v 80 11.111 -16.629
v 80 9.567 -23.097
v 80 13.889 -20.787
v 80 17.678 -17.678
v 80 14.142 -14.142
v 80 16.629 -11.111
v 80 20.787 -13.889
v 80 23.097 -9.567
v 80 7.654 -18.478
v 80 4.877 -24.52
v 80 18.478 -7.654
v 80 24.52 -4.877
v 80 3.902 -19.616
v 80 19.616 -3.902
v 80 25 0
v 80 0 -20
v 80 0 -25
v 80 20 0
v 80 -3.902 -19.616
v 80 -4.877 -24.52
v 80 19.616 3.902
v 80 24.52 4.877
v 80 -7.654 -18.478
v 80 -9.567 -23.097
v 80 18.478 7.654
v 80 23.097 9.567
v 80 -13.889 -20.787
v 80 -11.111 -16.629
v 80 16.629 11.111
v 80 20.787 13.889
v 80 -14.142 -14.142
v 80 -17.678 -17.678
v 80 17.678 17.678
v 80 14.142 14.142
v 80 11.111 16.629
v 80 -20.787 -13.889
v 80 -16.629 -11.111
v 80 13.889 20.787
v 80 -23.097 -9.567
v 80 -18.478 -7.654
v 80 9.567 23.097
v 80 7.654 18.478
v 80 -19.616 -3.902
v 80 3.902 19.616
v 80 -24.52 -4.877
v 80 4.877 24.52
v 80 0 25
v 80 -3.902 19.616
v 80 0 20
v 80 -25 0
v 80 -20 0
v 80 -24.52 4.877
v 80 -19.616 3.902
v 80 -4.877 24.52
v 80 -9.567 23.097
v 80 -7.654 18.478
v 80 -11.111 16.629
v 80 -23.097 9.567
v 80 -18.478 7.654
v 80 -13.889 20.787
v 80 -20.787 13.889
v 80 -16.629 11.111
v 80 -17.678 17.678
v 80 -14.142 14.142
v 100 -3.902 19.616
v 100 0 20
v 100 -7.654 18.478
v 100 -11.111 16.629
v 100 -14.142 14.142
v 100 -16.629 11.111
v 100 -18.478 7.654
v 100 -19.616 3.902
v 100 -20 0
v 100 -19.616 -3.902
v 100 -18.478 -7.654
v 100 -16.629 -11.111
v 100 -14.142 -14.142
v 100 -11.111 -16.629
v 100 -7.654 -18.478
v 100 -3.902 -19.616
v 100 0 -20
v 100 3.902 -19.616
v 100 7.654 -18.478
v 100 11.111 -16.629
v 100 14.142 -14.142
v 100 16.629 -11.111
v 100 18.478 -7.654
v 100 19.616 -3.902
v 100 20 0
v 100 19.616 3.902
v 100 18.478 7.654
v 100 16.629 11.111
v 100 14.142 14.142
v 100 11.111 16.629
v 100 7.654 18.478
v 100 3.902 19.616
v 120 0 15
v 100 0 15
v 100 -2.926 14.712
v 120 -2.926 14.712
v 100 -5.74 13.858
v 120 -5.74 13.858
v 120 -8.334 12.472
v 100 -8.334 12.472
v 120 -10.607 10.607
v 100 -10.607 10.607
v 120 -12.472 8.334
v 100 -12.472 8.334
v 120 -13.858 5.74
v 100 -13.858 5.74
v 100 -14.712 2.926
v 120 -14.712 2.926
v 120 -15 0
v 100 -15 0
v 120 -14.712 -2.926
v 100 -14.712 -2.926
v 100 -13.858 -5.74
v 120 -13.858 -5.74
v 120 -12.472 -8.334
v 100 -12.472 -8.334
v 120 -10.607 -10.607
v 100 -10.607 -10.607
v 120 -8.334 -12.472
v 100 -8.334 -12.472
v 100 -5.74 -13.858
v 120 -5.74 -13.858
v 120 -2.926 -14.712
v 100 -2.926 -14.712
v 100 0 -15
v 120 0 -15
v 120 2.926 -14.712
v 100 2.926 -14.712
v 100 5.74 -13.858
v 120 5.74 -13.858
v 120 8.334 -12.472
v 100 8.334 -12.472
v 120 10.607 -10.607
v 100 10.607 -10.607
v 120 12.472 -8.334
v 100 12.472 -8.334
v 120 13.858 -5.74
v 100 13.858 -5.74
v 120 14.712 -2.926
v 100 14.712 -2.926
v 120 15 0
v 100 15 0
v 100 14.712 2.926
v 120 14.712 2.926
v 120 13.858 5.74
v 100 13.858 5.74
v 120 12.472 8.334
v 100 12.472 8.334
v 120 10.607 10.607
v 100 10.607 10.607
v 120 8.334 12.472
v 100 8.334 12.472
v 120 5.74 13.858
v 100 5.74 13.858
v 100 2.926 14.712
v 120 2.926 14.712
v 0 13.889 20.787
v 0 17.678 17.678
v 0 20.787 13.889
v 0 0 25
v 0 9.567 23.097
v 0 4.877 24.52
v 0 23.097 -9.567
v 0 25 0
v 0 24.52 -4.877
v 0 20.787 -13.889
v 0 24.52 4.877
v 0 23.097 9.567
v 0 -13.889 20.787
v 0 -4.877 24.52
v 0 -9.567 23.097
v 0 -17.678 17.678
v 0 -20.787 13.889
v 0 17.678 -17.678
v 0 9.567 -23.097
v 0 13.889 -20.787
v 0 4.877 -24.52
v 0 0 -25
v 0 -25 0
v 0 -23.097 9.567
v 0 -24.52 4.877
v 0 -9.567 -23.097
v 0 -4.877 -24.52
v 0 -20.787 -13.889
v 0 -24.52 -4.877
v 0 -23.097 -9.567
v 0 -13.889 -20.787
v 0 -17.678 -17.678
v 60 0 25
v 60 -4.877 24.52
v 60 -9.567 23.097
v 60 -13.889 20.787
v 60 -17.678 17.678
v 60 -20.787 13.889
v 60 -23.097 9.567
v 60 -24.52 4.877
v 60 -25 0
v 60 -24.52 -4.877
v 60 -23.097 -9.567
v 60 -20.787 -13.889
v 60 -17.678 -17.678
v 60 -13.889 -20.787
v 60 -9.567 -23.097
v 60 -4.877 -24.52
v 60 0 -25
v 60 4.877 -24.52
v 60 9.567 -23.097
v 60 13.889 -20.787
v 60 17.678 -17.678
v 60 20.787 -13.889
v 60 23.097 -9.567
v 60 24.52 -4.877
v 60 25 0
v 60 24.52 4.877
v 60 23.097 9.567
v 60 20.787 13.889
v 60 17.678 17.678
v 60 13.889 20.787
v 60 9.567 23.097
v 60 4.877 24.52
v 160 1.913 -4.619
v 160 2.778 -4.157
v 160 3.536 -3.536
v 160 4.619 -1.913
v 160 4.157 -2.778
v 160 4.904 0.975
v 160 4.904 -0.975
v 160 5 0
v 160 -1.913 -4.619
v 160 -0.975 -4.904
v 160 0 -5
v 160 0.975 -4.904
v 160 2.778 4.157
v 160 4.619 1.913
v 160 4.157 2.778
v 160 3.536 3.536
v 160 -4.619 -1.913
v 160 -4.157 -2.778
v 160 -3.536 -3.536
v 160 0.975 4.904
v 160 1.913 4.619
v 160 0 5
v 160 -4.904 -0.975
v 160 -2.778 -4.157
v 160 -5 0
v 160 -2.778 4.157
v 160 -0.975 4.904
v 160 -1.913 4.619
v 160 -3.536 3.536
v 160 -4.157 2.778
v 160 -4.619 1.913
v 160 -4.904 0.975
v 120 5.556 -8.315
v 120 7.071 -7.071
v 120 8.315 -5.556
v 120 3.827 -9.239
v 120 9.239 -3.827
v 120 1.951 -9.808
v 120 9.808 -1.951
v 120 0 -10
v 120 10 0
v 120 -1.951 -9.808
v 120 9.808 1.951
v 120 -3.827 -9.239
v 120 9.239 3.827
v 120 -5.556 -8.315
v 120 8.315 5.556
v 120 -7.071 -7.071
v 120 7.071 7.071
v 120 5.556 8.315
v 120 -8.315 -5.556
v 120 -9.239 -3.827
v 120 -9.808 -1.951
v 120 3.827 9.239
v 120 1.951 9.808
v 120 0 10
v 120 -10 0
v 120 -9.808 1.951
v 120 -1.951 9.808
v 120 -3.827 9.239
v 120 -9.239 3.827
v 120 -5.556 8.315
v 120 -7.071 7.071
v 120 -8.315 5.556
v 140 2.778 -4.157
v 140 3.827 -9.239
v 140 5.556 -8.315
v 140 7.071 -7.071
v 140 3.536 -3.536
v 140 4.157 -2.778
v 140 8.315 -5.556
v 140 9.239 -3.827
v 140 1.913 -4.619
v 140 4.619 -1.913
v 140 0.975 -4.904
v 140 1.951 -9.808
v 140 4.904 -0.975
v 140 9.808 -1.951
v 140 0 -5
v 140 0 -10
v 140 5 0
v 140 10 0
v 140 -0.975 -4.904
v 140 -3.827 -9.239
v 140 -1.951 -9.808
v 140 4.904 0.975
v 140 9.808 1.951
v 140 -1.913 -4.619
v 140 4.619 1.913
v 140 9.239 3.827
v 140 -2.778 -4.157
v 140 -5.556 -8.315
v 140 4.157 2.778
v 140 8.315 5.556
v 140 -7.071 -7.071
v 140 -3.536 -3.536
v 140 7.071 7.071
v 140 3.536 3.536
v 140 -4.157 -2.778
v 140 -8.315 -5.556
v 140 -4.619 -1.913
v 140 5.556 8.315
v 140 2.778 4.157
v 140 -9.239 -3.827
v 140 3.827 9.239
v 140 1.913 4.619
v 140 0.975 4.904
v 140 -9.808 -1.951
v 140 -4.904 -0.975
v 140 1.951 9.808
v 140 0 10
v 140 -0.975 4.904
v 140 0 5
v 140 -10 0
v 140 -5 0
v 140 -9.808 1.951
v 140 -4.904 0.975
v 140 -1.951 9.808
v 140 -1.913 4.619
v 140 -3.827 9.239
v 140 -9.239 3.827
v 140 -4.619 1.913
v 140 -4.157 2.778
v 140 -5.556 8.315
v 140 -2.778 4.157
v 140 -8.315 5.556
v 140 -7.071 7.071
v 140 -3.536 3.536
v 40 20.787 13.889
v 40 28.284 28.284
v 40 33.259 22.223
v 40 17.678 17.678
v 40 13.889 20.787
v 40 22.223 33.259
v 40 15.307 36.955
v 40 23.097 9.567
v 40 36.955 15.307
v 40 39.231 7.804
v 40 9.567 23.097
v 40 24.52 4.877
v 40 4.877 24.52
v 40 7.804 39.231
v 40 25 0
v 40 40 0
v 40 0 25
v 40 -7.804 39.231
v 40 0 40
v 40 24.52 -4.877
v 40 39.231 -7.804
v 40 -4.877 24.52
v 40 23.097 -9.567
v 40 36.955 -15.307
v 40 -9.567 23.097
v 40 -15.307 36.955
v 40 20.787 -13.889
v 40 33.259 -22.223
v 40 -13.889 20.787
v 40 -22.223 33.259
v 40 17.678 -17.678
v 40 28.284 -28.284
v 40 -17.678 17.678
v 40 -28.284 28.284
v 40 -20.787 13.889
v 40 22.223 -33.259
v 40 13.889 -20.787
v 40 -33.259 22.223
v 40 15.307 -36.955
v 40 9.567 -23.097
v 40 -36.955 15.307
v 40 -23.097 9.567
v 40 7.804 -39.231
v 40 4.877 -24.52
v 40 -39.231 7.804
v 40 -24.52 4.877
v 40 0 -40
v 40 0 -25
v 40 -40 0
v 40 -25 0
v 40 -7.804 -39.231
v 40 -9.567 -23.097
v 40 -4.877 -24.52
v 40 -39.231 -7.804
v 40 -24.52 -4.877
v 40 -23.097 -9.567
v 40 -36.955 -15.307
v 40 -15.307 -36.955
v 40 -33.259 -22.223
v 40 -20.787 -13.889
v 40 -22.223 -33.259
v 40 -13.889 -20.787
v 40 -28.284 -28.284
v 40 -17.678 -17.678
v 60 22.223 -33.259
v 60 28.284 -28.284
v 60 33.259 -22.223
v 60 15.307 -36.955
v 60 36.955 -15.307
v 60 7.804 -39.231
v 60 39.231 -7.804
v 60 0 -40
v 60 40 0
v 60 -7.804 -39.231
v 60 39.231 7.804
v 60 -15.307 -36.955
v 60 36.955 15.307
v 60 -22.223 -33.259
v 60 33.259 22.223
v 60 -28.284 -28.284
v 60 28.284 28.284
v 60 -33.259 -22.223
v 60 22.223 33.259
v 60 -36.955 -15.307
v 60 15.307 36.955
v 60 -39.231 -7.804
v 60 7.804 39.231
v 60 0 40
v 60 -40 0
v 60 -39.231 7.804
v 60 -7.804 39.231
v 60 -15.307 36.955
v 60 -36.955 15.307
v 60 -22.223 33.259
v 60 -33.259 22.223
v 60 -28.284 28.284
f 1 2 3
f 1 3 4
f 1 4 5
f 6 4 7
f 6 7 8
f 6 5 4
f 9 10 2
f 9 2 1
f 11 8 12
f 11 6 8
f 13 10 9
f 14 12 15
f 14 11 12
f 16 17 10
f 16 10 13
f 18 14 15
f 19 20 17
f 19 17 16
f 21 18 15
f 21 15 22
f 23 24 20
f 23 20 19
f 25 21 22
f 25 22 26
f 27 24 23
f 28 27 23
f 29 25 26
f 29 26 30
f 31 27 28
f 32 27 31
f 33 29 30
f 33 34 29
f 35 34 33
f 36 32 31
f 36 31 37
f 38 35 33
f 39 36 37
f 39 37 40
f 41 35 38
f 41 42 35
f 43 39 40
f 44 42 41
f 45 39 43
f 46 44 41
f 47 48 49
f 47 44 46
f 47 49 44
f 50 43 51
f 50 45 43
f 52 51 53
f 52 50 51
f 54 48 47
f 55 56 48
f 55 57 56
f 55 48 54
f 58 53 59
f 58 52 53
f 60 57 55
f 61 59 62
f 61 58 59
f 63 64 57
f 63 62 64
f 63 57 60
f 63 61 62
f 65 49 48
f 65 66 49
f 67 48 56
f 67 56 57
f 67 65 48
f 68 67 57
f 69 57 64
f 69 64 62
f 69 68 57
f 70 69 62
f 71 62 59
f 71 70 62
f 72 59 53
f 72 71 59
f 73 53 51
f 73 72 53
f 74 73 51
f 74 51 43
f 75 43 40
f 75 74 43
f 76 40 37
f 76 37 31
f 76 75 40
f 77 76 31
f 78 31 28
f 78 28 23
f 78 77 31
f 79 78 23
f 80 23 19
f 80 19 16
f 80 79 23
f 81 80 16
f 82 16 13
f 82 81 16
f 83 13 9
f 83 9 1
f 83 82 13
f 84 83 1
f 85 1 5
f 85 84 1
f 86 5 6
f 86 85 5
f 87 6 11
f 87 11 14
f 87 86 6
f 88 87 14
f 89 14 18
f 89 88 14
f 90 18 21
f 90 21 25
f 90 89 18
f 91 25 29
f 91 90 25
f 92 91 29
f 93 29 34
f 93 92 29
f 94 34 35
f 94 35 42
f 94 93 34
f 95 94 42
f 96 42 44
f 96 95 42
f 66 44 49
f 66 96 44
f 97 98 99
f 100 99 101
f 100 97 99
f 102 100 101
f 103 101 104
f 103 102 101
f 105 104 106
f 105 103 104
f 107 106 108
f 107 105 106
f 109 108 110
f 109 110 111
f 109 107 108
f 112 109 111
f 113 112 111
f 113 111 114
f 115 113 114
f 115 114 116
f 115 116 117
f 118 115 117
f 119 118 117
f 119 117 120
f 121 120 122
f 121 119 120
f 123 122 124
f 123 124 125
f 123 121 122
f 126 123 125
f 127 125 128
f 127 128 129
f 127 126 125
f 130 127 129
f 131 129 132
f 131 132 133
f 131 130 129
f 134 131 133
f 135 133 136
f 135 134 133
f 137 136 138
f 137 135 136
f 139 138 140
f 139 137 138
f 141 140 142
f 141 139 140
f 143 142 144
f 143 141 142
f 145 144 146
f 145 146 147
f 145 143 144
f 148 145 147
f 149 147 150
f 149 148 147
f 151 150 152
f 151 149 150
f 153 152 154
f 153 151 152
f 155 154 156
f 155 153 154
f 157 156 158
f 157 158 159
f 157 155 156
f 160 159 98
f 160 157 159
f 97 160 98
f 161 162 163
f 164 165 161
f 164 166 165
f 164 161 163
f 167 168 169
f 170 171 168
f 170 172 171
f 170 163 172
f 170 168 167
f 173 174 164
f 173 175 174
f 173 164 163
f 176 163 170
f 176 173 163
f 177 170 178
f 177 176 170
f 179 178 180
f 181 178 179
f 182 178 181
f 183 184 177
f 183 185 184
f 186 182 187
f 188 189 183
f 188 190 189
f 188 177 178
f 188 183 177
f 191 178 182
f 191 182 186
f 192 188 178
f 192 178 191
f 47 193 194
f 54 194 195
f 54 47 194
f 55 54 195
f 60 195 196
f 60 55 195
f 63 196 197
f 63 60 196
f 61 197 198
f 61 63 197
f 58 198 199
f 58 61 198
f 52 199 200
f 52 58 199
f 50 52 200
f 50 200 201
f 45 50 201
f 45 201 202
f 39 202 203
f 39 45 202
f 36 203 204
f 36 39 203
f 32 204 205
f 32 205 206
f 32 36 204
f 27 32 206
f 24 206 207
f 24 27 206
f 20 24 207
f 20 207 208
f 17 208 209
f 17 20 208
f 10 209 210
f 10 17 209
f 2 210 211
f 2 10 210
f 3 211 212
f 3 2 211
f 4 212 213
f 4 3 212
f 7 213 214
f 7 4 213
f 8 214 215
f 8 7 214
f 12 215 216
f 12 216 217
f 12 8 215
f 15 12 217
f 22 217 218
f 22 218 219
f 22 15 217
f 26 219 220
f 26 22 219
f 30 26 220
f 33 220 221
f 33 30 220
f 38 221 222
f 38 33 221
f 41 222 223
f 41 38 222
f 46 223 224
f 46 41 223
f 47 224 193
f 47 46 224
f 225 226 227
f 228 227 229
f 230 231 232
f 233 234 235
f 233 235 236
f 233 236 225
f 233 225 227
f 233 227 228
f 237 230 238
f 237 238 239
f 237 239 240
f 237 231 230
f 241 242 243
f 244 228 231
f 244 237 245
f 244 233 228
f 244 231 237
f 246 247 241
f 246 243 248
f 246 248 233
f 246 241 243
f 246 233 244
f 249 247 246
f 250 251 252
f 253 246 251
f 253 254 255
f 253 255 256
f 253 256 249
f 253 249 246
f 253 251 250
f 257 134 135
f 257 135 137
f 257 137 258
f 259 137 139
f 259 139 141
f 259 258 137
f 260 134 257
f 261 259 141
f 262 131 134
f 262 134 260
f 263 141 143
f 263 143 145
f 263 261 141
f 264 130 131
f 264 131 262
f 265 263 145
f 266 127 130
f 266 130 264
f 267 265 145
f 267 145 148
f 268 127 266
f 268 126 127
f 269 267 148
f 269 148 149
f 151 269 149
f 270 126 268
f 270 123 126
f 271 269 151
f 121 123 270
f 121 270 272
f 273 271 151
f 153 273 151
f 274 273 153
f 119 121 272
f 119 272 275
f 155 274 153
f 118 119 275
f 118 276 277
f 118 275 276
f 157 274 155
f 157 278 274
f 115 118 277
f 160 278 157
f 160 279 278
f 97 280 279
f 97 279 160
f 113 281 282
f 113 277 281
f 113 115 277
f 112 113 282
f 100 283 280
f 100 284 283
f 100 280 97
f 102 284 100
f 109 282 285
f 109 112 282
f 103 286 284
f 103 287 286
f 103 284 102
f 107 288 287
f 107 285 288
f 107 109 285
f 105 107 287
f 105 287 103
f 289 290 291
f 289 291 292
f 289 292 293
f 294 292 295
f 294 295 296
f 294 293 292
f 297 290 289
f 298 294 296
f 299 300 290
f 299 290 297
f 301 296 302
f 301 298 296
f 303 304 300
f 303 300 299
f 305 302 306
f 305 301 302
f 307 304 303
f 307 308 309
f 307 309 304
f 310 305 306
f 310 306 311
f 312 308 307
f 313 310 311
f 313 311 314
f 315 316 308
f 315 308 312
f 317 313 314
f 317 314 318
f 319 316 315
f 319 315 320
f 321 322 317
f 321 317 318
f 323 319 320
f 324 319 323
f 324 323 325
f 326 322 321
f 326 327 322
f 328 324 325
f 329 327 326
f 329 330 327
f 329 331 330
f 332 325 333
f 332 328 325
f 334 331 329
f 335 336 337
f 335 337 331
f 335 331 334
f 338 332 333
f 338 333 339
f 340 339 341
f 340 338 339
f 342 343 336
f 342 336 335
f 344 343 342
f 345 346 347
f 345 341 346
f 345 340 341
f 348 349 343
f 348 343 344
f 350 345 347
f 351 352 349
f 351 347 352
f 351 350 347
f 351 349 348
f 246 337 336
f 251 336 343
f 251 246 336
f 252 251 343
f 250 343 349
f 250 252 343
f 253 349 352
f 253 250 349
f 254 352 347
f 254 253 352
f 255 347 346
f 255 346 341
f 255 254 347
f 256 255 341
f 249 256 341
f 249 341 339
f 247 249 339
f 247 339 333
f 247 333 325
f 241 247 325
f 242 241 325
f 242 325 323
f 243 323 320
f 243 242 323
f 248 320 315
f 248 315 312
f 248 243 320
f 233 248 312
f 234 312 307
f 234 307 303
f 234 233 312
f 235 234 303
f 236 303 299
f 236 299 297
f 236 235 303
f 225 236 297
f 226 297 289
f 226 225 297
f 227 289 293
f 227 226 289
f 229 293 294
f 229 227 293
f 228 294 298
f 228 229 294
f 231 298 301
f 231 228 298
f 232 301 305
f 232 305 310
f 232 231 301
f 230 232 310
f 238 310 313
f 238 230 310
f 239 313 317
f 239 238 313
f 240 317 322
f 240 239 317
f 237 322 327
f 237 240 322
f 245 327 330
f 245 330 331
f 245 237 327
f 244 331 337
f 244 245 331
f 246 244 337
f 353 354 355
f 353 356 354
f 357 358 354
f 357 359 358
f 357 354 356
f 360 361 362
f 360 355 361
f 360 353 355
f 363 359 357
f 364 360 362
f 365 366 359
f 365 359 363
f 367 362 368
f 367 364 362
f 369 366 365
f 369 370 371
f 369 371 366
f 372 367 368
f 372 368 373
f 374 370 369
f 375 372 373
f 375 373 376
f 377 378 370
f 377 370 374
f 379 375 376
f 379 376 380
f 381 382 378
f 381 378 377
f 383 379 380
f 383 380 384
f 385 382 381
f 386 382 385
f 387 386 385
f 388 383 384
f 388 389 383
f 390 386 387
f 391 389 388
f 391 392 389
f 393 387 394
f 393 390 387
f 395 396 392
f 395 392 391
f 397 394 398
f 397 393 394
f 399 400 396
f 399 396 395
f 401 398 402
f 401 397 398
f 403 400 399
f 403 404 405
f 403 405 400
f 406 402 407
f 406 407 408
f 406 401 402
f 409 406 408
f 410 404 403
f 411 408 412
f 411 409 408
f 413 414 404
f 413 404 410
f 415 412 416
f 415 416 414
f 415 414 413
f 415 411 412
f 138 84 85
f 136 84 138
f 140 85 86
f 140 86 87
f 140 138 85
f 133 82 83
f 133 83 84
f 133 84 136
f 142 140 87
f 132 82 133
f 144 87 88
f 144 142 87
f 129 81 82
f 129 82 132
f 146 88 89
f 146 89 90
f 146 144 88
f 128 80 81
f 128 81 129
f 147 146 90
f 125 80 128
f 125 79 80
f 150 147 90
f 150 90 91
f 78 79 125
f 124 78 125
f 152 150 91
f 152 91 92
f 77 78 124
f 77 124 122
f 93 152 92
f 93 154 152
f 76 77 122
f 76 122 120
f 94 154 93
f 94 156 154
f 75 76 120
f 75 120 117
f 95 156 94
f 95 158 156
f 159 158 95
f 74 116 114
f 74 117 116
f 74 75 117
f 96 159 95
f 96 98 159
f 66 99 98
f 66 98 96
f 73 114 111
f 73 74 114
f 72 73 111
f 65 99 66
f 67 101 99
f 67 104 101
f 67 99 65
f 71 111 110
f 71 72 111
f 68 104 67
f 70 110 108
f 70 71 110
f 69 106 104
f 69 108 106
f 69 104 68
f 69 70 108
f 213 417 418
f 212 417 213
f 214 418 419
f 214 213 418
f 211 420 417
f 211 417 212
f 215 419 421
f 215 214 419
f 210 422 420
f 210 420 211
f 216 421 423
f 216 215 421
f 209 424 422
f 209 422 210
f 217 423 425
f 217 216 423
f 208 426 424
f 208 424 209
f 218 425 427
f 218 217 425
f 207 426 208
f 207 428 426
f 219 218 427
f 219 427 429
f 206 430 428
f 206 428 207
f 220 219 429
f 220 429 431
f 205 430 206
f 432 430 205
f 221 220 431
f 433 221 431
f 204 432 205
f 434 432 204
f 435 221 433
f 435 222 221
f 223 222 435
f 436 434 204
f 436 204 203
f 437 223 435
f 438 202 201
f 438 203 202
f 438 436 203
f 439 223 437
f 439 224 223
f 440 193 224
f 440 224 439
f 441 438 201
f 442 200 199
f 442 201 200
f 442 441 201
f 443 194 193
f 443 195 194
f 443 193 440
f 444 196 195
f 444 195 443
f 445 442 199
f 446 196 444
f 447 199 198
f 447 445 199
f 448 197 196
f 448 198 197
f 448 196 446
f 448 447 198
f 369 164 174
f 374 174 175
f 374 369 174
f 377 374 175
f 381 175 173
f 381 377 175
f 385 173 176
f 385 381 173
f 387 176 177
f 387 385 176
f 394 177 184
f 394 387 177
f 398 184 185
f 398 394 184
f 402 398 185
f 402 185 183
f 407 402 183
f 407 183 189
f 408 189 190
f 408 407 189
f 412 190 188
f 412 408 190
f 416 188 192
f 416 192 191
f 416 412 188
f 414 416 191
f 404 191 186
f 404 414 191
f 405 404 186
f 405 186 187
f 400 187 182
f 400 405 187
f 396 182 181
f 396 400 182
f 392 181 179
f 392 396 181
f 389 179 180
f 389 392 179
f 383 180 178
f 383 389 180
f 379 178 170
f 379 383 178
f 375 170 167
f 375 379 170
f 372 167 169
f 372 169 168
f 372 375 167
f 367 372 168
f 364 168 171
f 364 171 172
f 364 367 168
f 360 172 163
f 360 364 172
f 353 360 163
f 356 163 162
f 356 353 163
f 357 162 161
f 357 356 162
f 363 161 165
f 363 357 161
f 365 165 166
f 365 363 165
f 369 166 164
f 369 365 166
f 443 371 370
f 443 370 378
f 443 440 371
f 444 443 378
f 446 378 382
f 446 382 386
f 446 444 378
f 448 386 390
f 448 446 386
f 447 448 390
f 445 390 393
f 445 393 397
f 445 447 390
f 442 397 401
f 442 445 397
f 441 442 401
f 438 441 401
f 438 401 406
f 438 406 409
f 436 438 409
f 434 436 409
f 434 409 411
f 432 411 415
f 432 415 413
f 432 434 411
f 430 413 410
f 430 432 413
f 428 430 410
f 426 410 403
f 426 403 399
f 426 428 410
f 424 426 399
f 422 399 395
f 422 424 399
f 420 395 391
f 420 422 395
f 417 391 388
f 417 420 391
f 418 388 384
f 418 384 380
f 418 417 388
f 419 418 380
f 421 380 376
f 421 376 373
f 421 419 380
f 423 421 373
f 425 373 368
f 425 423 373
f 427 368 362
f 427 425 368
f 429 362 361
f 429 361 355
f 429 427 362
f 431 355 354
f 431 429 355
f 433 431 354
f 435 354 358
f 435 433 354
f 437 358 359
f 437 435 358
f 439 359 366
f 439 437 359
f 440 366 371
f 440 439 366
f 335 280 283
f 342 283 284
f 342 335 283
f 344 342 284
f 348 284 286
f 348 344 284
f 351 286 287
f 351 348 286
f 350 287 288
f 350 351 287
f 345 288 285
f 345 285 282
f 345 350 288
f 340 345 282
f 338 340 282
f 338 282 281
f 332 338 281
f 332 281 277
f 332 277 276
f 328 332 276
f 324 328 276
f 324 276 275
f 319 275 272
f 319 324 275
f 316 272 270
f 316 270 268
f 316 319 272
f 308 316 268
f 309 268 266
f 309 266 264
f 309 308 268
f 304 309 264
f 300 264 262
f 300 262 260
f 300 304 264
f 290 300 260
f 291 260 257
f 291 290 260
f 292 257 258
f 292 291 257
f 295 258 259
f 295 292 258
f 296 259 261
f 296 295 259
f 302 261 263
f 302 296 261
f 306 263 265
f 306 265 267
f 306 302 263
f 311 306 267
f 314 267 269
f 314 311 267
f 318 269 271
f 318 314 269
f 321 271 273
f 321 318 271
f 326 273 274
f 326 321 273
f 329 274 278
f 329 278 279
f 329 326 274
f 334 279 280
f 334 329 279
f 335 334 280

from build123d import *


with BuildPart() as part:
    # Sketch1 → Revolve1 (revolve)
    with BuildSketch(Plane.XY, mode=Mode.PRIVATE) as revolve1_sk:
        Polygon((0, 0), (0, 25), (40, 25), (40, 40), (60, 40), (60, 25), (80, 25), (80, 20), (100, 20), (100, 15), (120, 15), (120, 10), (140, 10), (140, 5), (160, 5), (160, 0), align=None)
    revolve(revolve1_sk.sketch.rotate(Axis((0, 0, 0), (1, 0, 0)), 90), axis=Axis((0, 0, 0), (1, 0, 0)))  # turned: the seam where the file's is


solid = part.part
